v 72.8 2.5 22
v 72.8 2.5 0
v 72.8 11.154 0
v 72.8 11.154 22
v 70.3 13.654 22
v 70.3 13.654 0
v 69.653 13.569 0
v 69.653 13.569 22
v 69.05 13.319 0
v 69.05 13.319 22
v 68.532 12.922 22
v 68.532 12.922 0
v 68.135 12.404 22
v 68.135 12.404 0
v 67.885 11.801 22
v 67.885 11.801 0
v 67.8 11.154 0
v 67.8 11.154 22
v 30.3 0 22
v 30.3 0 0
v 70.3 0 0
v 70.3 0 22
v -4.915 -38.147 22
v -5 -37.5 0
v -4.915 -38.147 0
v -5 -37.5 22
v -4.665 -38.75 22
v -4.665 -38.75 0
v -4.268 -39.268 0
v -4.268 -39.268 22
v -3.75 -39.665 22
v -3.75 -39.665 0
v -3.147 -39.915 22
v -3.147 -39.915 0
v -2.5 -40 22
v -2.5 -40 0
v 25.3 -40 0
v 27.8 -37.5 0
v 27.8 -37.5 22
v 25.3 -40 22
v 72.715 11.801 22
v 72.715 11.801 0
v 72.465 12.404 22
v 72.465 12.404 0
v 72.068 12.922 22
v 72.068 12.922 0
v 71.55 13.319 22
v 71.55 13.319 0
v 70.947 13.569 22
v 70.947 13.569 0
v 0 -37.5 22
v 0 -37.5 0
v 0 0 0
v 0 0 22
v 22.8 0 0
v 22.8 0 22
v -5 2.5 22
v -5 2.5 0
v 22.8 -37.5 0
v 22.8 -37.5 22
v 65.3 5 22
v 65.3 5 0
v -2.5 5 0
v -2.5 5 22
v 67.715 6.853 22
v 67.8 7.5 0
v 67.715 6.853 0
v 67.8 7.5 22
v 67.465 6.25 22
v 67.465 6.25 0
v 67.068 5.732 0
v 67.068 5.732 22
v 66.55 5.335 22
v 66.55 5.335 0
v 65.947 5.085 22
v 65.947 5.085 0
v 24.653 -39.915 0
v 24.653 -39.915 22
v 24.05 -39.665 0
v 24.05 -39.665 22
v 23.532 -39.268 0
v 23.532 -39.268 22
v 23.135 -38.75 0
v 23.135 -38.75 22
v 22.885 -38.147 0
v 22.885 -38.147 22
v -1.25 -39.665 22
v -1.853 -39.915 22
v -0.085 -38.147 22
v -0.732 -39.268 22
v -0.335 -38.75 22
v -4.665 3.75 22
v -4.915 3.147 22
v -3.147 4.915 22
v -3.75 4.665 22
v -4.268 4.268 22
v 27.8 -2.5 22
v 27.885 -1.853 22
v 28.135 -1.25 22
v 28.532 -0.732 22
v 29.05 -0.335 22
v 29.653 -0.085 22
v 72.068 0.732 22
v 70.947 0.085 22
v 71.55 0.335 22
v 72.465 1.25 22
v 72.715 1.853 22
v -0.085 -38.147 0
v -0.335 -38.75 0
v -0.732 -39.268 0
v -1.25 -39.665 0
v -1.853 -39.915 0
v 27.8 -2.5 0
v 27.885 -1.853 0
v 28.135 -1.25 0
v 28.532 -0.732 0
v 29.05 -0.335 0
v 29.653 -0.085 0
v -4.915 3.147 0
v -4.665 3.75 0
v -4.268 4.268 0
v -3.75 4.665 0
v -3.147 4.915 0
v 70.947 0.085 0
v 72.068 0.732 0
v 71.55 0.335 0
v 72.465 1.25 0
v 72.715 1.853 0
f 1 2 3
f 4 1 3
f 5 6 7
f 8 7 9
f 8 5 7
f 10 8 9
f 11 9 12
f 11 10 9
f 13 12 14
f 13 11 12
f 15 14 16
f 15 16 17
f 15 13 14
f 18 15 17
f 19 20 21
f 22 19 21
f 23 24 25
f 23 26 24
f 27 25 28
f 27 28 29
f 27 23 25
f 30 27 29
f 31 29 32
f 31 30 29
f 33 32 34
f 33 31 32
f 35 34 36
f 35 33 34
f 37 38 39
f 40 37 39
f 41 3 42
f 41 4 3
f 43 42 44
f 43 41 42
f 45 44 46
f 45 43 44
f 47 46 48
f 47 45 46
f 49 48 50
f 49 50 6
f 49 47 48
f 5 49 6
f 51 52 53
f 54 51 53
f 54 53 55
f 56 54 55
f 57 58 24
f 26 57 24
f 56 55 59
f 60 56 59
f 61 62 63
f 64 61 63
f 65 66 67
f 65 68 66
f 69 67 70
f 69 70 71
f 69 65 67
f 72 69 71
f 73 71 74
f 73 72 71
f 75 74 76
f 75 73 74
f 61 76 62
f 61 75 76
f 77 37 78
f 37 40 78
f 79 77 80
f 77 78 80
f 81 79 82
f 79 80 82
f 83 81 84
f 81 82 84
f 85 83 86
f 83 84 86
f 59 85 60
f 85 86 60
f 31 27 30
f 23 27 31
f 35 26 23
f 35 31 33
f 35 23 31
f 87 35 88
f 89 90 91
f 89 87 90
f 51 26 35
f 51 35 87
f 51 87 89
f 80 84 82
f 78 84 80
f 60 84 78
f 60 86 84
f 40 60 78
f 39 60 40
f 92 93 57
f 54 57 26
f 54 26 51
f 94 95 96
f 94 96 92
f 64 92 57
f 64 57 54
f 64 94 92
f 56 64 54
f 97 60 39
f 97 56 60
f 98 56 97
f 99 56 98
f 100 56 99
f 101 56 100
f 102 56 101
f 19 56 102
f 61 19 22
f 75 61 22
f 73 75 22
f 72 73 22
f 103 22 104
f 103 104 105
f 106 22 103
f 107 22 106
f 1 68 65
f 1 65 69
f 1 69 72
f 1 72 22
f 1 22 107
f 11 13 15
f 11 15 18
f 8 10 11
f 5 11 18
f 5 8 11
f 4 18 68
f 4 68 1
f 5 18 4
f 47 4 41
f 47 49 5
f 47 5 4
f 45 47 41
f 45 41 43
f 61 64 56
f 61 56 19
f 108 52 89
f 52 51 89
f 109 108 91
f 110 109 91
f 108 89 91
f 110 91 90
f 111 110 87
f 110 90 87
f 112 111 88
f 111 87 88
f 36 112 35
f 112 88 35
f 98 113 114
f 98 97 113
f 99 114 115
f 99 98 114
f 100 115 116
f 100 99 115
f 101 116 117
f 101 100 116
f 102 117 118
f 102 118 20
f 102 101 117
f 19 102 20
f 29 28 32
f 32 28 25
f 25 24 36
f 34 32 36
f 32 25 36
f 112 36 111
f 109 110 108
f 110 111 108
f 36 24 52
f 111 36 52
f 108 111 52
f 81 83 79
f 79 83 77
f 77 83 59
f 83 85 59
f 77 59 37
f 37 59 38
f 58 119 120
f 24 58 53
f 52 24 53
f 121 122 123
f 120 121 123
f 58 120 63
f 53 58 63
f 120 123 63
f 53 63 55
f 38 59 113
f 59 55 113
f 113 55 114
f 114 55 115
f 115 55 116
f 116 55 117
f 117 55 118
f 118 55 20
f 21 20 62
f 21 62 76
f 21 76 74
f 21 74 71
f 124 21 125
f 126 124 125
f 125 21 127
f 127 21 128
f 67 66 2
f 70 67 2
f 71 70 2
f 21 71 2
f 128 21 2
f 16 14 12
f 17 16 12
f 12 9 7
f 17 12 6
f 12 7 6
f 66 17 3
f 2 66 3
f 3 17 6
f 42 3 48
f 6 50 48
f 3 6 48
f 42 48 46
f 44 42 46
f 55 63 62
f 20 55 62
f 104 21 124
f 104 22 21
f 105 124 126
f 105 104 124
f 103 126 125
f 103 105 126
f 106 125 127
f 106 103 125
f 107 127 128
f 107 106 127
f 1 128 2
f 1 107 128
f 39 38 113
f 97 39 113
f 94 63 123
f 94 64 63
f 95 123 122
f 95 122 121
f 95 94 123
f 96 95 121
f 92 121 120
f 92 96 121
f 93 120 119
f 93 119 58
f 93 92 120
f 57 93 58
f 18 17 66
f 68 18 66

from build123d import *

# Parameters (mm, degrees)
F1_DEPTH = 22
F2_R     = 2.49999
F3_SIZE  = 2.5
F4_R     = 2.49999


# Not quite as in the source:
# - a fillet or chamfer is up to 0.001 mm smaller than in the source, because OpenCascade refuses the exact size


with BuildPart() as f1:
    # F0 (on Top) → F1 (new body)
    with BuildSketch(Plane.XY):
        Polygon((0, -40), (0, 0), (22.8, 0), (22.8, -40), (27.8, -40), (27.8, 0), (72.8, 0), (72.8, 13.6540349229), (67.8, 13.6540349229), (67.8, 5), (-5, 5), (-5, -40), align=None)
    extrude(amount=F1_DEPTH)

    # F2 (radius 2.5 in the source; OpenCascade refuses exactly that, so slightly less here)
    f2_edges = [f1.edges().sort_by_distance(p)[0] for p in [
        (72.8, 0, 11),
        (27.8, 0, 11),
        (67.8, 5, 11),
        (67.8, 13.654035, 11),
        (72.8, 13.654035, 11),
        (-5, 5, 11),
        (-5, -40, 11),
        (0, -40, 11),
    ]]
    fillet(f2_edges, radius=F2_R)

    # F3
    f3_edges = [f1.edges().sort_by_distance(p)[0] for p in [
        (27.8, -40, 11),
    ]]
    chamfer(f3_edges, length=F3_SIZE)

    # F4 (radius 2.5 in the source; OpenCascade refuses exactly that, so slightly less here)
    f4_edges = [f1.edges().sort_by_distance(p)[0] for p in [
        (22.8, -40, 11),
    ]]
    fillet(f4_edges, radius=F4_R)


solid = f1.part
